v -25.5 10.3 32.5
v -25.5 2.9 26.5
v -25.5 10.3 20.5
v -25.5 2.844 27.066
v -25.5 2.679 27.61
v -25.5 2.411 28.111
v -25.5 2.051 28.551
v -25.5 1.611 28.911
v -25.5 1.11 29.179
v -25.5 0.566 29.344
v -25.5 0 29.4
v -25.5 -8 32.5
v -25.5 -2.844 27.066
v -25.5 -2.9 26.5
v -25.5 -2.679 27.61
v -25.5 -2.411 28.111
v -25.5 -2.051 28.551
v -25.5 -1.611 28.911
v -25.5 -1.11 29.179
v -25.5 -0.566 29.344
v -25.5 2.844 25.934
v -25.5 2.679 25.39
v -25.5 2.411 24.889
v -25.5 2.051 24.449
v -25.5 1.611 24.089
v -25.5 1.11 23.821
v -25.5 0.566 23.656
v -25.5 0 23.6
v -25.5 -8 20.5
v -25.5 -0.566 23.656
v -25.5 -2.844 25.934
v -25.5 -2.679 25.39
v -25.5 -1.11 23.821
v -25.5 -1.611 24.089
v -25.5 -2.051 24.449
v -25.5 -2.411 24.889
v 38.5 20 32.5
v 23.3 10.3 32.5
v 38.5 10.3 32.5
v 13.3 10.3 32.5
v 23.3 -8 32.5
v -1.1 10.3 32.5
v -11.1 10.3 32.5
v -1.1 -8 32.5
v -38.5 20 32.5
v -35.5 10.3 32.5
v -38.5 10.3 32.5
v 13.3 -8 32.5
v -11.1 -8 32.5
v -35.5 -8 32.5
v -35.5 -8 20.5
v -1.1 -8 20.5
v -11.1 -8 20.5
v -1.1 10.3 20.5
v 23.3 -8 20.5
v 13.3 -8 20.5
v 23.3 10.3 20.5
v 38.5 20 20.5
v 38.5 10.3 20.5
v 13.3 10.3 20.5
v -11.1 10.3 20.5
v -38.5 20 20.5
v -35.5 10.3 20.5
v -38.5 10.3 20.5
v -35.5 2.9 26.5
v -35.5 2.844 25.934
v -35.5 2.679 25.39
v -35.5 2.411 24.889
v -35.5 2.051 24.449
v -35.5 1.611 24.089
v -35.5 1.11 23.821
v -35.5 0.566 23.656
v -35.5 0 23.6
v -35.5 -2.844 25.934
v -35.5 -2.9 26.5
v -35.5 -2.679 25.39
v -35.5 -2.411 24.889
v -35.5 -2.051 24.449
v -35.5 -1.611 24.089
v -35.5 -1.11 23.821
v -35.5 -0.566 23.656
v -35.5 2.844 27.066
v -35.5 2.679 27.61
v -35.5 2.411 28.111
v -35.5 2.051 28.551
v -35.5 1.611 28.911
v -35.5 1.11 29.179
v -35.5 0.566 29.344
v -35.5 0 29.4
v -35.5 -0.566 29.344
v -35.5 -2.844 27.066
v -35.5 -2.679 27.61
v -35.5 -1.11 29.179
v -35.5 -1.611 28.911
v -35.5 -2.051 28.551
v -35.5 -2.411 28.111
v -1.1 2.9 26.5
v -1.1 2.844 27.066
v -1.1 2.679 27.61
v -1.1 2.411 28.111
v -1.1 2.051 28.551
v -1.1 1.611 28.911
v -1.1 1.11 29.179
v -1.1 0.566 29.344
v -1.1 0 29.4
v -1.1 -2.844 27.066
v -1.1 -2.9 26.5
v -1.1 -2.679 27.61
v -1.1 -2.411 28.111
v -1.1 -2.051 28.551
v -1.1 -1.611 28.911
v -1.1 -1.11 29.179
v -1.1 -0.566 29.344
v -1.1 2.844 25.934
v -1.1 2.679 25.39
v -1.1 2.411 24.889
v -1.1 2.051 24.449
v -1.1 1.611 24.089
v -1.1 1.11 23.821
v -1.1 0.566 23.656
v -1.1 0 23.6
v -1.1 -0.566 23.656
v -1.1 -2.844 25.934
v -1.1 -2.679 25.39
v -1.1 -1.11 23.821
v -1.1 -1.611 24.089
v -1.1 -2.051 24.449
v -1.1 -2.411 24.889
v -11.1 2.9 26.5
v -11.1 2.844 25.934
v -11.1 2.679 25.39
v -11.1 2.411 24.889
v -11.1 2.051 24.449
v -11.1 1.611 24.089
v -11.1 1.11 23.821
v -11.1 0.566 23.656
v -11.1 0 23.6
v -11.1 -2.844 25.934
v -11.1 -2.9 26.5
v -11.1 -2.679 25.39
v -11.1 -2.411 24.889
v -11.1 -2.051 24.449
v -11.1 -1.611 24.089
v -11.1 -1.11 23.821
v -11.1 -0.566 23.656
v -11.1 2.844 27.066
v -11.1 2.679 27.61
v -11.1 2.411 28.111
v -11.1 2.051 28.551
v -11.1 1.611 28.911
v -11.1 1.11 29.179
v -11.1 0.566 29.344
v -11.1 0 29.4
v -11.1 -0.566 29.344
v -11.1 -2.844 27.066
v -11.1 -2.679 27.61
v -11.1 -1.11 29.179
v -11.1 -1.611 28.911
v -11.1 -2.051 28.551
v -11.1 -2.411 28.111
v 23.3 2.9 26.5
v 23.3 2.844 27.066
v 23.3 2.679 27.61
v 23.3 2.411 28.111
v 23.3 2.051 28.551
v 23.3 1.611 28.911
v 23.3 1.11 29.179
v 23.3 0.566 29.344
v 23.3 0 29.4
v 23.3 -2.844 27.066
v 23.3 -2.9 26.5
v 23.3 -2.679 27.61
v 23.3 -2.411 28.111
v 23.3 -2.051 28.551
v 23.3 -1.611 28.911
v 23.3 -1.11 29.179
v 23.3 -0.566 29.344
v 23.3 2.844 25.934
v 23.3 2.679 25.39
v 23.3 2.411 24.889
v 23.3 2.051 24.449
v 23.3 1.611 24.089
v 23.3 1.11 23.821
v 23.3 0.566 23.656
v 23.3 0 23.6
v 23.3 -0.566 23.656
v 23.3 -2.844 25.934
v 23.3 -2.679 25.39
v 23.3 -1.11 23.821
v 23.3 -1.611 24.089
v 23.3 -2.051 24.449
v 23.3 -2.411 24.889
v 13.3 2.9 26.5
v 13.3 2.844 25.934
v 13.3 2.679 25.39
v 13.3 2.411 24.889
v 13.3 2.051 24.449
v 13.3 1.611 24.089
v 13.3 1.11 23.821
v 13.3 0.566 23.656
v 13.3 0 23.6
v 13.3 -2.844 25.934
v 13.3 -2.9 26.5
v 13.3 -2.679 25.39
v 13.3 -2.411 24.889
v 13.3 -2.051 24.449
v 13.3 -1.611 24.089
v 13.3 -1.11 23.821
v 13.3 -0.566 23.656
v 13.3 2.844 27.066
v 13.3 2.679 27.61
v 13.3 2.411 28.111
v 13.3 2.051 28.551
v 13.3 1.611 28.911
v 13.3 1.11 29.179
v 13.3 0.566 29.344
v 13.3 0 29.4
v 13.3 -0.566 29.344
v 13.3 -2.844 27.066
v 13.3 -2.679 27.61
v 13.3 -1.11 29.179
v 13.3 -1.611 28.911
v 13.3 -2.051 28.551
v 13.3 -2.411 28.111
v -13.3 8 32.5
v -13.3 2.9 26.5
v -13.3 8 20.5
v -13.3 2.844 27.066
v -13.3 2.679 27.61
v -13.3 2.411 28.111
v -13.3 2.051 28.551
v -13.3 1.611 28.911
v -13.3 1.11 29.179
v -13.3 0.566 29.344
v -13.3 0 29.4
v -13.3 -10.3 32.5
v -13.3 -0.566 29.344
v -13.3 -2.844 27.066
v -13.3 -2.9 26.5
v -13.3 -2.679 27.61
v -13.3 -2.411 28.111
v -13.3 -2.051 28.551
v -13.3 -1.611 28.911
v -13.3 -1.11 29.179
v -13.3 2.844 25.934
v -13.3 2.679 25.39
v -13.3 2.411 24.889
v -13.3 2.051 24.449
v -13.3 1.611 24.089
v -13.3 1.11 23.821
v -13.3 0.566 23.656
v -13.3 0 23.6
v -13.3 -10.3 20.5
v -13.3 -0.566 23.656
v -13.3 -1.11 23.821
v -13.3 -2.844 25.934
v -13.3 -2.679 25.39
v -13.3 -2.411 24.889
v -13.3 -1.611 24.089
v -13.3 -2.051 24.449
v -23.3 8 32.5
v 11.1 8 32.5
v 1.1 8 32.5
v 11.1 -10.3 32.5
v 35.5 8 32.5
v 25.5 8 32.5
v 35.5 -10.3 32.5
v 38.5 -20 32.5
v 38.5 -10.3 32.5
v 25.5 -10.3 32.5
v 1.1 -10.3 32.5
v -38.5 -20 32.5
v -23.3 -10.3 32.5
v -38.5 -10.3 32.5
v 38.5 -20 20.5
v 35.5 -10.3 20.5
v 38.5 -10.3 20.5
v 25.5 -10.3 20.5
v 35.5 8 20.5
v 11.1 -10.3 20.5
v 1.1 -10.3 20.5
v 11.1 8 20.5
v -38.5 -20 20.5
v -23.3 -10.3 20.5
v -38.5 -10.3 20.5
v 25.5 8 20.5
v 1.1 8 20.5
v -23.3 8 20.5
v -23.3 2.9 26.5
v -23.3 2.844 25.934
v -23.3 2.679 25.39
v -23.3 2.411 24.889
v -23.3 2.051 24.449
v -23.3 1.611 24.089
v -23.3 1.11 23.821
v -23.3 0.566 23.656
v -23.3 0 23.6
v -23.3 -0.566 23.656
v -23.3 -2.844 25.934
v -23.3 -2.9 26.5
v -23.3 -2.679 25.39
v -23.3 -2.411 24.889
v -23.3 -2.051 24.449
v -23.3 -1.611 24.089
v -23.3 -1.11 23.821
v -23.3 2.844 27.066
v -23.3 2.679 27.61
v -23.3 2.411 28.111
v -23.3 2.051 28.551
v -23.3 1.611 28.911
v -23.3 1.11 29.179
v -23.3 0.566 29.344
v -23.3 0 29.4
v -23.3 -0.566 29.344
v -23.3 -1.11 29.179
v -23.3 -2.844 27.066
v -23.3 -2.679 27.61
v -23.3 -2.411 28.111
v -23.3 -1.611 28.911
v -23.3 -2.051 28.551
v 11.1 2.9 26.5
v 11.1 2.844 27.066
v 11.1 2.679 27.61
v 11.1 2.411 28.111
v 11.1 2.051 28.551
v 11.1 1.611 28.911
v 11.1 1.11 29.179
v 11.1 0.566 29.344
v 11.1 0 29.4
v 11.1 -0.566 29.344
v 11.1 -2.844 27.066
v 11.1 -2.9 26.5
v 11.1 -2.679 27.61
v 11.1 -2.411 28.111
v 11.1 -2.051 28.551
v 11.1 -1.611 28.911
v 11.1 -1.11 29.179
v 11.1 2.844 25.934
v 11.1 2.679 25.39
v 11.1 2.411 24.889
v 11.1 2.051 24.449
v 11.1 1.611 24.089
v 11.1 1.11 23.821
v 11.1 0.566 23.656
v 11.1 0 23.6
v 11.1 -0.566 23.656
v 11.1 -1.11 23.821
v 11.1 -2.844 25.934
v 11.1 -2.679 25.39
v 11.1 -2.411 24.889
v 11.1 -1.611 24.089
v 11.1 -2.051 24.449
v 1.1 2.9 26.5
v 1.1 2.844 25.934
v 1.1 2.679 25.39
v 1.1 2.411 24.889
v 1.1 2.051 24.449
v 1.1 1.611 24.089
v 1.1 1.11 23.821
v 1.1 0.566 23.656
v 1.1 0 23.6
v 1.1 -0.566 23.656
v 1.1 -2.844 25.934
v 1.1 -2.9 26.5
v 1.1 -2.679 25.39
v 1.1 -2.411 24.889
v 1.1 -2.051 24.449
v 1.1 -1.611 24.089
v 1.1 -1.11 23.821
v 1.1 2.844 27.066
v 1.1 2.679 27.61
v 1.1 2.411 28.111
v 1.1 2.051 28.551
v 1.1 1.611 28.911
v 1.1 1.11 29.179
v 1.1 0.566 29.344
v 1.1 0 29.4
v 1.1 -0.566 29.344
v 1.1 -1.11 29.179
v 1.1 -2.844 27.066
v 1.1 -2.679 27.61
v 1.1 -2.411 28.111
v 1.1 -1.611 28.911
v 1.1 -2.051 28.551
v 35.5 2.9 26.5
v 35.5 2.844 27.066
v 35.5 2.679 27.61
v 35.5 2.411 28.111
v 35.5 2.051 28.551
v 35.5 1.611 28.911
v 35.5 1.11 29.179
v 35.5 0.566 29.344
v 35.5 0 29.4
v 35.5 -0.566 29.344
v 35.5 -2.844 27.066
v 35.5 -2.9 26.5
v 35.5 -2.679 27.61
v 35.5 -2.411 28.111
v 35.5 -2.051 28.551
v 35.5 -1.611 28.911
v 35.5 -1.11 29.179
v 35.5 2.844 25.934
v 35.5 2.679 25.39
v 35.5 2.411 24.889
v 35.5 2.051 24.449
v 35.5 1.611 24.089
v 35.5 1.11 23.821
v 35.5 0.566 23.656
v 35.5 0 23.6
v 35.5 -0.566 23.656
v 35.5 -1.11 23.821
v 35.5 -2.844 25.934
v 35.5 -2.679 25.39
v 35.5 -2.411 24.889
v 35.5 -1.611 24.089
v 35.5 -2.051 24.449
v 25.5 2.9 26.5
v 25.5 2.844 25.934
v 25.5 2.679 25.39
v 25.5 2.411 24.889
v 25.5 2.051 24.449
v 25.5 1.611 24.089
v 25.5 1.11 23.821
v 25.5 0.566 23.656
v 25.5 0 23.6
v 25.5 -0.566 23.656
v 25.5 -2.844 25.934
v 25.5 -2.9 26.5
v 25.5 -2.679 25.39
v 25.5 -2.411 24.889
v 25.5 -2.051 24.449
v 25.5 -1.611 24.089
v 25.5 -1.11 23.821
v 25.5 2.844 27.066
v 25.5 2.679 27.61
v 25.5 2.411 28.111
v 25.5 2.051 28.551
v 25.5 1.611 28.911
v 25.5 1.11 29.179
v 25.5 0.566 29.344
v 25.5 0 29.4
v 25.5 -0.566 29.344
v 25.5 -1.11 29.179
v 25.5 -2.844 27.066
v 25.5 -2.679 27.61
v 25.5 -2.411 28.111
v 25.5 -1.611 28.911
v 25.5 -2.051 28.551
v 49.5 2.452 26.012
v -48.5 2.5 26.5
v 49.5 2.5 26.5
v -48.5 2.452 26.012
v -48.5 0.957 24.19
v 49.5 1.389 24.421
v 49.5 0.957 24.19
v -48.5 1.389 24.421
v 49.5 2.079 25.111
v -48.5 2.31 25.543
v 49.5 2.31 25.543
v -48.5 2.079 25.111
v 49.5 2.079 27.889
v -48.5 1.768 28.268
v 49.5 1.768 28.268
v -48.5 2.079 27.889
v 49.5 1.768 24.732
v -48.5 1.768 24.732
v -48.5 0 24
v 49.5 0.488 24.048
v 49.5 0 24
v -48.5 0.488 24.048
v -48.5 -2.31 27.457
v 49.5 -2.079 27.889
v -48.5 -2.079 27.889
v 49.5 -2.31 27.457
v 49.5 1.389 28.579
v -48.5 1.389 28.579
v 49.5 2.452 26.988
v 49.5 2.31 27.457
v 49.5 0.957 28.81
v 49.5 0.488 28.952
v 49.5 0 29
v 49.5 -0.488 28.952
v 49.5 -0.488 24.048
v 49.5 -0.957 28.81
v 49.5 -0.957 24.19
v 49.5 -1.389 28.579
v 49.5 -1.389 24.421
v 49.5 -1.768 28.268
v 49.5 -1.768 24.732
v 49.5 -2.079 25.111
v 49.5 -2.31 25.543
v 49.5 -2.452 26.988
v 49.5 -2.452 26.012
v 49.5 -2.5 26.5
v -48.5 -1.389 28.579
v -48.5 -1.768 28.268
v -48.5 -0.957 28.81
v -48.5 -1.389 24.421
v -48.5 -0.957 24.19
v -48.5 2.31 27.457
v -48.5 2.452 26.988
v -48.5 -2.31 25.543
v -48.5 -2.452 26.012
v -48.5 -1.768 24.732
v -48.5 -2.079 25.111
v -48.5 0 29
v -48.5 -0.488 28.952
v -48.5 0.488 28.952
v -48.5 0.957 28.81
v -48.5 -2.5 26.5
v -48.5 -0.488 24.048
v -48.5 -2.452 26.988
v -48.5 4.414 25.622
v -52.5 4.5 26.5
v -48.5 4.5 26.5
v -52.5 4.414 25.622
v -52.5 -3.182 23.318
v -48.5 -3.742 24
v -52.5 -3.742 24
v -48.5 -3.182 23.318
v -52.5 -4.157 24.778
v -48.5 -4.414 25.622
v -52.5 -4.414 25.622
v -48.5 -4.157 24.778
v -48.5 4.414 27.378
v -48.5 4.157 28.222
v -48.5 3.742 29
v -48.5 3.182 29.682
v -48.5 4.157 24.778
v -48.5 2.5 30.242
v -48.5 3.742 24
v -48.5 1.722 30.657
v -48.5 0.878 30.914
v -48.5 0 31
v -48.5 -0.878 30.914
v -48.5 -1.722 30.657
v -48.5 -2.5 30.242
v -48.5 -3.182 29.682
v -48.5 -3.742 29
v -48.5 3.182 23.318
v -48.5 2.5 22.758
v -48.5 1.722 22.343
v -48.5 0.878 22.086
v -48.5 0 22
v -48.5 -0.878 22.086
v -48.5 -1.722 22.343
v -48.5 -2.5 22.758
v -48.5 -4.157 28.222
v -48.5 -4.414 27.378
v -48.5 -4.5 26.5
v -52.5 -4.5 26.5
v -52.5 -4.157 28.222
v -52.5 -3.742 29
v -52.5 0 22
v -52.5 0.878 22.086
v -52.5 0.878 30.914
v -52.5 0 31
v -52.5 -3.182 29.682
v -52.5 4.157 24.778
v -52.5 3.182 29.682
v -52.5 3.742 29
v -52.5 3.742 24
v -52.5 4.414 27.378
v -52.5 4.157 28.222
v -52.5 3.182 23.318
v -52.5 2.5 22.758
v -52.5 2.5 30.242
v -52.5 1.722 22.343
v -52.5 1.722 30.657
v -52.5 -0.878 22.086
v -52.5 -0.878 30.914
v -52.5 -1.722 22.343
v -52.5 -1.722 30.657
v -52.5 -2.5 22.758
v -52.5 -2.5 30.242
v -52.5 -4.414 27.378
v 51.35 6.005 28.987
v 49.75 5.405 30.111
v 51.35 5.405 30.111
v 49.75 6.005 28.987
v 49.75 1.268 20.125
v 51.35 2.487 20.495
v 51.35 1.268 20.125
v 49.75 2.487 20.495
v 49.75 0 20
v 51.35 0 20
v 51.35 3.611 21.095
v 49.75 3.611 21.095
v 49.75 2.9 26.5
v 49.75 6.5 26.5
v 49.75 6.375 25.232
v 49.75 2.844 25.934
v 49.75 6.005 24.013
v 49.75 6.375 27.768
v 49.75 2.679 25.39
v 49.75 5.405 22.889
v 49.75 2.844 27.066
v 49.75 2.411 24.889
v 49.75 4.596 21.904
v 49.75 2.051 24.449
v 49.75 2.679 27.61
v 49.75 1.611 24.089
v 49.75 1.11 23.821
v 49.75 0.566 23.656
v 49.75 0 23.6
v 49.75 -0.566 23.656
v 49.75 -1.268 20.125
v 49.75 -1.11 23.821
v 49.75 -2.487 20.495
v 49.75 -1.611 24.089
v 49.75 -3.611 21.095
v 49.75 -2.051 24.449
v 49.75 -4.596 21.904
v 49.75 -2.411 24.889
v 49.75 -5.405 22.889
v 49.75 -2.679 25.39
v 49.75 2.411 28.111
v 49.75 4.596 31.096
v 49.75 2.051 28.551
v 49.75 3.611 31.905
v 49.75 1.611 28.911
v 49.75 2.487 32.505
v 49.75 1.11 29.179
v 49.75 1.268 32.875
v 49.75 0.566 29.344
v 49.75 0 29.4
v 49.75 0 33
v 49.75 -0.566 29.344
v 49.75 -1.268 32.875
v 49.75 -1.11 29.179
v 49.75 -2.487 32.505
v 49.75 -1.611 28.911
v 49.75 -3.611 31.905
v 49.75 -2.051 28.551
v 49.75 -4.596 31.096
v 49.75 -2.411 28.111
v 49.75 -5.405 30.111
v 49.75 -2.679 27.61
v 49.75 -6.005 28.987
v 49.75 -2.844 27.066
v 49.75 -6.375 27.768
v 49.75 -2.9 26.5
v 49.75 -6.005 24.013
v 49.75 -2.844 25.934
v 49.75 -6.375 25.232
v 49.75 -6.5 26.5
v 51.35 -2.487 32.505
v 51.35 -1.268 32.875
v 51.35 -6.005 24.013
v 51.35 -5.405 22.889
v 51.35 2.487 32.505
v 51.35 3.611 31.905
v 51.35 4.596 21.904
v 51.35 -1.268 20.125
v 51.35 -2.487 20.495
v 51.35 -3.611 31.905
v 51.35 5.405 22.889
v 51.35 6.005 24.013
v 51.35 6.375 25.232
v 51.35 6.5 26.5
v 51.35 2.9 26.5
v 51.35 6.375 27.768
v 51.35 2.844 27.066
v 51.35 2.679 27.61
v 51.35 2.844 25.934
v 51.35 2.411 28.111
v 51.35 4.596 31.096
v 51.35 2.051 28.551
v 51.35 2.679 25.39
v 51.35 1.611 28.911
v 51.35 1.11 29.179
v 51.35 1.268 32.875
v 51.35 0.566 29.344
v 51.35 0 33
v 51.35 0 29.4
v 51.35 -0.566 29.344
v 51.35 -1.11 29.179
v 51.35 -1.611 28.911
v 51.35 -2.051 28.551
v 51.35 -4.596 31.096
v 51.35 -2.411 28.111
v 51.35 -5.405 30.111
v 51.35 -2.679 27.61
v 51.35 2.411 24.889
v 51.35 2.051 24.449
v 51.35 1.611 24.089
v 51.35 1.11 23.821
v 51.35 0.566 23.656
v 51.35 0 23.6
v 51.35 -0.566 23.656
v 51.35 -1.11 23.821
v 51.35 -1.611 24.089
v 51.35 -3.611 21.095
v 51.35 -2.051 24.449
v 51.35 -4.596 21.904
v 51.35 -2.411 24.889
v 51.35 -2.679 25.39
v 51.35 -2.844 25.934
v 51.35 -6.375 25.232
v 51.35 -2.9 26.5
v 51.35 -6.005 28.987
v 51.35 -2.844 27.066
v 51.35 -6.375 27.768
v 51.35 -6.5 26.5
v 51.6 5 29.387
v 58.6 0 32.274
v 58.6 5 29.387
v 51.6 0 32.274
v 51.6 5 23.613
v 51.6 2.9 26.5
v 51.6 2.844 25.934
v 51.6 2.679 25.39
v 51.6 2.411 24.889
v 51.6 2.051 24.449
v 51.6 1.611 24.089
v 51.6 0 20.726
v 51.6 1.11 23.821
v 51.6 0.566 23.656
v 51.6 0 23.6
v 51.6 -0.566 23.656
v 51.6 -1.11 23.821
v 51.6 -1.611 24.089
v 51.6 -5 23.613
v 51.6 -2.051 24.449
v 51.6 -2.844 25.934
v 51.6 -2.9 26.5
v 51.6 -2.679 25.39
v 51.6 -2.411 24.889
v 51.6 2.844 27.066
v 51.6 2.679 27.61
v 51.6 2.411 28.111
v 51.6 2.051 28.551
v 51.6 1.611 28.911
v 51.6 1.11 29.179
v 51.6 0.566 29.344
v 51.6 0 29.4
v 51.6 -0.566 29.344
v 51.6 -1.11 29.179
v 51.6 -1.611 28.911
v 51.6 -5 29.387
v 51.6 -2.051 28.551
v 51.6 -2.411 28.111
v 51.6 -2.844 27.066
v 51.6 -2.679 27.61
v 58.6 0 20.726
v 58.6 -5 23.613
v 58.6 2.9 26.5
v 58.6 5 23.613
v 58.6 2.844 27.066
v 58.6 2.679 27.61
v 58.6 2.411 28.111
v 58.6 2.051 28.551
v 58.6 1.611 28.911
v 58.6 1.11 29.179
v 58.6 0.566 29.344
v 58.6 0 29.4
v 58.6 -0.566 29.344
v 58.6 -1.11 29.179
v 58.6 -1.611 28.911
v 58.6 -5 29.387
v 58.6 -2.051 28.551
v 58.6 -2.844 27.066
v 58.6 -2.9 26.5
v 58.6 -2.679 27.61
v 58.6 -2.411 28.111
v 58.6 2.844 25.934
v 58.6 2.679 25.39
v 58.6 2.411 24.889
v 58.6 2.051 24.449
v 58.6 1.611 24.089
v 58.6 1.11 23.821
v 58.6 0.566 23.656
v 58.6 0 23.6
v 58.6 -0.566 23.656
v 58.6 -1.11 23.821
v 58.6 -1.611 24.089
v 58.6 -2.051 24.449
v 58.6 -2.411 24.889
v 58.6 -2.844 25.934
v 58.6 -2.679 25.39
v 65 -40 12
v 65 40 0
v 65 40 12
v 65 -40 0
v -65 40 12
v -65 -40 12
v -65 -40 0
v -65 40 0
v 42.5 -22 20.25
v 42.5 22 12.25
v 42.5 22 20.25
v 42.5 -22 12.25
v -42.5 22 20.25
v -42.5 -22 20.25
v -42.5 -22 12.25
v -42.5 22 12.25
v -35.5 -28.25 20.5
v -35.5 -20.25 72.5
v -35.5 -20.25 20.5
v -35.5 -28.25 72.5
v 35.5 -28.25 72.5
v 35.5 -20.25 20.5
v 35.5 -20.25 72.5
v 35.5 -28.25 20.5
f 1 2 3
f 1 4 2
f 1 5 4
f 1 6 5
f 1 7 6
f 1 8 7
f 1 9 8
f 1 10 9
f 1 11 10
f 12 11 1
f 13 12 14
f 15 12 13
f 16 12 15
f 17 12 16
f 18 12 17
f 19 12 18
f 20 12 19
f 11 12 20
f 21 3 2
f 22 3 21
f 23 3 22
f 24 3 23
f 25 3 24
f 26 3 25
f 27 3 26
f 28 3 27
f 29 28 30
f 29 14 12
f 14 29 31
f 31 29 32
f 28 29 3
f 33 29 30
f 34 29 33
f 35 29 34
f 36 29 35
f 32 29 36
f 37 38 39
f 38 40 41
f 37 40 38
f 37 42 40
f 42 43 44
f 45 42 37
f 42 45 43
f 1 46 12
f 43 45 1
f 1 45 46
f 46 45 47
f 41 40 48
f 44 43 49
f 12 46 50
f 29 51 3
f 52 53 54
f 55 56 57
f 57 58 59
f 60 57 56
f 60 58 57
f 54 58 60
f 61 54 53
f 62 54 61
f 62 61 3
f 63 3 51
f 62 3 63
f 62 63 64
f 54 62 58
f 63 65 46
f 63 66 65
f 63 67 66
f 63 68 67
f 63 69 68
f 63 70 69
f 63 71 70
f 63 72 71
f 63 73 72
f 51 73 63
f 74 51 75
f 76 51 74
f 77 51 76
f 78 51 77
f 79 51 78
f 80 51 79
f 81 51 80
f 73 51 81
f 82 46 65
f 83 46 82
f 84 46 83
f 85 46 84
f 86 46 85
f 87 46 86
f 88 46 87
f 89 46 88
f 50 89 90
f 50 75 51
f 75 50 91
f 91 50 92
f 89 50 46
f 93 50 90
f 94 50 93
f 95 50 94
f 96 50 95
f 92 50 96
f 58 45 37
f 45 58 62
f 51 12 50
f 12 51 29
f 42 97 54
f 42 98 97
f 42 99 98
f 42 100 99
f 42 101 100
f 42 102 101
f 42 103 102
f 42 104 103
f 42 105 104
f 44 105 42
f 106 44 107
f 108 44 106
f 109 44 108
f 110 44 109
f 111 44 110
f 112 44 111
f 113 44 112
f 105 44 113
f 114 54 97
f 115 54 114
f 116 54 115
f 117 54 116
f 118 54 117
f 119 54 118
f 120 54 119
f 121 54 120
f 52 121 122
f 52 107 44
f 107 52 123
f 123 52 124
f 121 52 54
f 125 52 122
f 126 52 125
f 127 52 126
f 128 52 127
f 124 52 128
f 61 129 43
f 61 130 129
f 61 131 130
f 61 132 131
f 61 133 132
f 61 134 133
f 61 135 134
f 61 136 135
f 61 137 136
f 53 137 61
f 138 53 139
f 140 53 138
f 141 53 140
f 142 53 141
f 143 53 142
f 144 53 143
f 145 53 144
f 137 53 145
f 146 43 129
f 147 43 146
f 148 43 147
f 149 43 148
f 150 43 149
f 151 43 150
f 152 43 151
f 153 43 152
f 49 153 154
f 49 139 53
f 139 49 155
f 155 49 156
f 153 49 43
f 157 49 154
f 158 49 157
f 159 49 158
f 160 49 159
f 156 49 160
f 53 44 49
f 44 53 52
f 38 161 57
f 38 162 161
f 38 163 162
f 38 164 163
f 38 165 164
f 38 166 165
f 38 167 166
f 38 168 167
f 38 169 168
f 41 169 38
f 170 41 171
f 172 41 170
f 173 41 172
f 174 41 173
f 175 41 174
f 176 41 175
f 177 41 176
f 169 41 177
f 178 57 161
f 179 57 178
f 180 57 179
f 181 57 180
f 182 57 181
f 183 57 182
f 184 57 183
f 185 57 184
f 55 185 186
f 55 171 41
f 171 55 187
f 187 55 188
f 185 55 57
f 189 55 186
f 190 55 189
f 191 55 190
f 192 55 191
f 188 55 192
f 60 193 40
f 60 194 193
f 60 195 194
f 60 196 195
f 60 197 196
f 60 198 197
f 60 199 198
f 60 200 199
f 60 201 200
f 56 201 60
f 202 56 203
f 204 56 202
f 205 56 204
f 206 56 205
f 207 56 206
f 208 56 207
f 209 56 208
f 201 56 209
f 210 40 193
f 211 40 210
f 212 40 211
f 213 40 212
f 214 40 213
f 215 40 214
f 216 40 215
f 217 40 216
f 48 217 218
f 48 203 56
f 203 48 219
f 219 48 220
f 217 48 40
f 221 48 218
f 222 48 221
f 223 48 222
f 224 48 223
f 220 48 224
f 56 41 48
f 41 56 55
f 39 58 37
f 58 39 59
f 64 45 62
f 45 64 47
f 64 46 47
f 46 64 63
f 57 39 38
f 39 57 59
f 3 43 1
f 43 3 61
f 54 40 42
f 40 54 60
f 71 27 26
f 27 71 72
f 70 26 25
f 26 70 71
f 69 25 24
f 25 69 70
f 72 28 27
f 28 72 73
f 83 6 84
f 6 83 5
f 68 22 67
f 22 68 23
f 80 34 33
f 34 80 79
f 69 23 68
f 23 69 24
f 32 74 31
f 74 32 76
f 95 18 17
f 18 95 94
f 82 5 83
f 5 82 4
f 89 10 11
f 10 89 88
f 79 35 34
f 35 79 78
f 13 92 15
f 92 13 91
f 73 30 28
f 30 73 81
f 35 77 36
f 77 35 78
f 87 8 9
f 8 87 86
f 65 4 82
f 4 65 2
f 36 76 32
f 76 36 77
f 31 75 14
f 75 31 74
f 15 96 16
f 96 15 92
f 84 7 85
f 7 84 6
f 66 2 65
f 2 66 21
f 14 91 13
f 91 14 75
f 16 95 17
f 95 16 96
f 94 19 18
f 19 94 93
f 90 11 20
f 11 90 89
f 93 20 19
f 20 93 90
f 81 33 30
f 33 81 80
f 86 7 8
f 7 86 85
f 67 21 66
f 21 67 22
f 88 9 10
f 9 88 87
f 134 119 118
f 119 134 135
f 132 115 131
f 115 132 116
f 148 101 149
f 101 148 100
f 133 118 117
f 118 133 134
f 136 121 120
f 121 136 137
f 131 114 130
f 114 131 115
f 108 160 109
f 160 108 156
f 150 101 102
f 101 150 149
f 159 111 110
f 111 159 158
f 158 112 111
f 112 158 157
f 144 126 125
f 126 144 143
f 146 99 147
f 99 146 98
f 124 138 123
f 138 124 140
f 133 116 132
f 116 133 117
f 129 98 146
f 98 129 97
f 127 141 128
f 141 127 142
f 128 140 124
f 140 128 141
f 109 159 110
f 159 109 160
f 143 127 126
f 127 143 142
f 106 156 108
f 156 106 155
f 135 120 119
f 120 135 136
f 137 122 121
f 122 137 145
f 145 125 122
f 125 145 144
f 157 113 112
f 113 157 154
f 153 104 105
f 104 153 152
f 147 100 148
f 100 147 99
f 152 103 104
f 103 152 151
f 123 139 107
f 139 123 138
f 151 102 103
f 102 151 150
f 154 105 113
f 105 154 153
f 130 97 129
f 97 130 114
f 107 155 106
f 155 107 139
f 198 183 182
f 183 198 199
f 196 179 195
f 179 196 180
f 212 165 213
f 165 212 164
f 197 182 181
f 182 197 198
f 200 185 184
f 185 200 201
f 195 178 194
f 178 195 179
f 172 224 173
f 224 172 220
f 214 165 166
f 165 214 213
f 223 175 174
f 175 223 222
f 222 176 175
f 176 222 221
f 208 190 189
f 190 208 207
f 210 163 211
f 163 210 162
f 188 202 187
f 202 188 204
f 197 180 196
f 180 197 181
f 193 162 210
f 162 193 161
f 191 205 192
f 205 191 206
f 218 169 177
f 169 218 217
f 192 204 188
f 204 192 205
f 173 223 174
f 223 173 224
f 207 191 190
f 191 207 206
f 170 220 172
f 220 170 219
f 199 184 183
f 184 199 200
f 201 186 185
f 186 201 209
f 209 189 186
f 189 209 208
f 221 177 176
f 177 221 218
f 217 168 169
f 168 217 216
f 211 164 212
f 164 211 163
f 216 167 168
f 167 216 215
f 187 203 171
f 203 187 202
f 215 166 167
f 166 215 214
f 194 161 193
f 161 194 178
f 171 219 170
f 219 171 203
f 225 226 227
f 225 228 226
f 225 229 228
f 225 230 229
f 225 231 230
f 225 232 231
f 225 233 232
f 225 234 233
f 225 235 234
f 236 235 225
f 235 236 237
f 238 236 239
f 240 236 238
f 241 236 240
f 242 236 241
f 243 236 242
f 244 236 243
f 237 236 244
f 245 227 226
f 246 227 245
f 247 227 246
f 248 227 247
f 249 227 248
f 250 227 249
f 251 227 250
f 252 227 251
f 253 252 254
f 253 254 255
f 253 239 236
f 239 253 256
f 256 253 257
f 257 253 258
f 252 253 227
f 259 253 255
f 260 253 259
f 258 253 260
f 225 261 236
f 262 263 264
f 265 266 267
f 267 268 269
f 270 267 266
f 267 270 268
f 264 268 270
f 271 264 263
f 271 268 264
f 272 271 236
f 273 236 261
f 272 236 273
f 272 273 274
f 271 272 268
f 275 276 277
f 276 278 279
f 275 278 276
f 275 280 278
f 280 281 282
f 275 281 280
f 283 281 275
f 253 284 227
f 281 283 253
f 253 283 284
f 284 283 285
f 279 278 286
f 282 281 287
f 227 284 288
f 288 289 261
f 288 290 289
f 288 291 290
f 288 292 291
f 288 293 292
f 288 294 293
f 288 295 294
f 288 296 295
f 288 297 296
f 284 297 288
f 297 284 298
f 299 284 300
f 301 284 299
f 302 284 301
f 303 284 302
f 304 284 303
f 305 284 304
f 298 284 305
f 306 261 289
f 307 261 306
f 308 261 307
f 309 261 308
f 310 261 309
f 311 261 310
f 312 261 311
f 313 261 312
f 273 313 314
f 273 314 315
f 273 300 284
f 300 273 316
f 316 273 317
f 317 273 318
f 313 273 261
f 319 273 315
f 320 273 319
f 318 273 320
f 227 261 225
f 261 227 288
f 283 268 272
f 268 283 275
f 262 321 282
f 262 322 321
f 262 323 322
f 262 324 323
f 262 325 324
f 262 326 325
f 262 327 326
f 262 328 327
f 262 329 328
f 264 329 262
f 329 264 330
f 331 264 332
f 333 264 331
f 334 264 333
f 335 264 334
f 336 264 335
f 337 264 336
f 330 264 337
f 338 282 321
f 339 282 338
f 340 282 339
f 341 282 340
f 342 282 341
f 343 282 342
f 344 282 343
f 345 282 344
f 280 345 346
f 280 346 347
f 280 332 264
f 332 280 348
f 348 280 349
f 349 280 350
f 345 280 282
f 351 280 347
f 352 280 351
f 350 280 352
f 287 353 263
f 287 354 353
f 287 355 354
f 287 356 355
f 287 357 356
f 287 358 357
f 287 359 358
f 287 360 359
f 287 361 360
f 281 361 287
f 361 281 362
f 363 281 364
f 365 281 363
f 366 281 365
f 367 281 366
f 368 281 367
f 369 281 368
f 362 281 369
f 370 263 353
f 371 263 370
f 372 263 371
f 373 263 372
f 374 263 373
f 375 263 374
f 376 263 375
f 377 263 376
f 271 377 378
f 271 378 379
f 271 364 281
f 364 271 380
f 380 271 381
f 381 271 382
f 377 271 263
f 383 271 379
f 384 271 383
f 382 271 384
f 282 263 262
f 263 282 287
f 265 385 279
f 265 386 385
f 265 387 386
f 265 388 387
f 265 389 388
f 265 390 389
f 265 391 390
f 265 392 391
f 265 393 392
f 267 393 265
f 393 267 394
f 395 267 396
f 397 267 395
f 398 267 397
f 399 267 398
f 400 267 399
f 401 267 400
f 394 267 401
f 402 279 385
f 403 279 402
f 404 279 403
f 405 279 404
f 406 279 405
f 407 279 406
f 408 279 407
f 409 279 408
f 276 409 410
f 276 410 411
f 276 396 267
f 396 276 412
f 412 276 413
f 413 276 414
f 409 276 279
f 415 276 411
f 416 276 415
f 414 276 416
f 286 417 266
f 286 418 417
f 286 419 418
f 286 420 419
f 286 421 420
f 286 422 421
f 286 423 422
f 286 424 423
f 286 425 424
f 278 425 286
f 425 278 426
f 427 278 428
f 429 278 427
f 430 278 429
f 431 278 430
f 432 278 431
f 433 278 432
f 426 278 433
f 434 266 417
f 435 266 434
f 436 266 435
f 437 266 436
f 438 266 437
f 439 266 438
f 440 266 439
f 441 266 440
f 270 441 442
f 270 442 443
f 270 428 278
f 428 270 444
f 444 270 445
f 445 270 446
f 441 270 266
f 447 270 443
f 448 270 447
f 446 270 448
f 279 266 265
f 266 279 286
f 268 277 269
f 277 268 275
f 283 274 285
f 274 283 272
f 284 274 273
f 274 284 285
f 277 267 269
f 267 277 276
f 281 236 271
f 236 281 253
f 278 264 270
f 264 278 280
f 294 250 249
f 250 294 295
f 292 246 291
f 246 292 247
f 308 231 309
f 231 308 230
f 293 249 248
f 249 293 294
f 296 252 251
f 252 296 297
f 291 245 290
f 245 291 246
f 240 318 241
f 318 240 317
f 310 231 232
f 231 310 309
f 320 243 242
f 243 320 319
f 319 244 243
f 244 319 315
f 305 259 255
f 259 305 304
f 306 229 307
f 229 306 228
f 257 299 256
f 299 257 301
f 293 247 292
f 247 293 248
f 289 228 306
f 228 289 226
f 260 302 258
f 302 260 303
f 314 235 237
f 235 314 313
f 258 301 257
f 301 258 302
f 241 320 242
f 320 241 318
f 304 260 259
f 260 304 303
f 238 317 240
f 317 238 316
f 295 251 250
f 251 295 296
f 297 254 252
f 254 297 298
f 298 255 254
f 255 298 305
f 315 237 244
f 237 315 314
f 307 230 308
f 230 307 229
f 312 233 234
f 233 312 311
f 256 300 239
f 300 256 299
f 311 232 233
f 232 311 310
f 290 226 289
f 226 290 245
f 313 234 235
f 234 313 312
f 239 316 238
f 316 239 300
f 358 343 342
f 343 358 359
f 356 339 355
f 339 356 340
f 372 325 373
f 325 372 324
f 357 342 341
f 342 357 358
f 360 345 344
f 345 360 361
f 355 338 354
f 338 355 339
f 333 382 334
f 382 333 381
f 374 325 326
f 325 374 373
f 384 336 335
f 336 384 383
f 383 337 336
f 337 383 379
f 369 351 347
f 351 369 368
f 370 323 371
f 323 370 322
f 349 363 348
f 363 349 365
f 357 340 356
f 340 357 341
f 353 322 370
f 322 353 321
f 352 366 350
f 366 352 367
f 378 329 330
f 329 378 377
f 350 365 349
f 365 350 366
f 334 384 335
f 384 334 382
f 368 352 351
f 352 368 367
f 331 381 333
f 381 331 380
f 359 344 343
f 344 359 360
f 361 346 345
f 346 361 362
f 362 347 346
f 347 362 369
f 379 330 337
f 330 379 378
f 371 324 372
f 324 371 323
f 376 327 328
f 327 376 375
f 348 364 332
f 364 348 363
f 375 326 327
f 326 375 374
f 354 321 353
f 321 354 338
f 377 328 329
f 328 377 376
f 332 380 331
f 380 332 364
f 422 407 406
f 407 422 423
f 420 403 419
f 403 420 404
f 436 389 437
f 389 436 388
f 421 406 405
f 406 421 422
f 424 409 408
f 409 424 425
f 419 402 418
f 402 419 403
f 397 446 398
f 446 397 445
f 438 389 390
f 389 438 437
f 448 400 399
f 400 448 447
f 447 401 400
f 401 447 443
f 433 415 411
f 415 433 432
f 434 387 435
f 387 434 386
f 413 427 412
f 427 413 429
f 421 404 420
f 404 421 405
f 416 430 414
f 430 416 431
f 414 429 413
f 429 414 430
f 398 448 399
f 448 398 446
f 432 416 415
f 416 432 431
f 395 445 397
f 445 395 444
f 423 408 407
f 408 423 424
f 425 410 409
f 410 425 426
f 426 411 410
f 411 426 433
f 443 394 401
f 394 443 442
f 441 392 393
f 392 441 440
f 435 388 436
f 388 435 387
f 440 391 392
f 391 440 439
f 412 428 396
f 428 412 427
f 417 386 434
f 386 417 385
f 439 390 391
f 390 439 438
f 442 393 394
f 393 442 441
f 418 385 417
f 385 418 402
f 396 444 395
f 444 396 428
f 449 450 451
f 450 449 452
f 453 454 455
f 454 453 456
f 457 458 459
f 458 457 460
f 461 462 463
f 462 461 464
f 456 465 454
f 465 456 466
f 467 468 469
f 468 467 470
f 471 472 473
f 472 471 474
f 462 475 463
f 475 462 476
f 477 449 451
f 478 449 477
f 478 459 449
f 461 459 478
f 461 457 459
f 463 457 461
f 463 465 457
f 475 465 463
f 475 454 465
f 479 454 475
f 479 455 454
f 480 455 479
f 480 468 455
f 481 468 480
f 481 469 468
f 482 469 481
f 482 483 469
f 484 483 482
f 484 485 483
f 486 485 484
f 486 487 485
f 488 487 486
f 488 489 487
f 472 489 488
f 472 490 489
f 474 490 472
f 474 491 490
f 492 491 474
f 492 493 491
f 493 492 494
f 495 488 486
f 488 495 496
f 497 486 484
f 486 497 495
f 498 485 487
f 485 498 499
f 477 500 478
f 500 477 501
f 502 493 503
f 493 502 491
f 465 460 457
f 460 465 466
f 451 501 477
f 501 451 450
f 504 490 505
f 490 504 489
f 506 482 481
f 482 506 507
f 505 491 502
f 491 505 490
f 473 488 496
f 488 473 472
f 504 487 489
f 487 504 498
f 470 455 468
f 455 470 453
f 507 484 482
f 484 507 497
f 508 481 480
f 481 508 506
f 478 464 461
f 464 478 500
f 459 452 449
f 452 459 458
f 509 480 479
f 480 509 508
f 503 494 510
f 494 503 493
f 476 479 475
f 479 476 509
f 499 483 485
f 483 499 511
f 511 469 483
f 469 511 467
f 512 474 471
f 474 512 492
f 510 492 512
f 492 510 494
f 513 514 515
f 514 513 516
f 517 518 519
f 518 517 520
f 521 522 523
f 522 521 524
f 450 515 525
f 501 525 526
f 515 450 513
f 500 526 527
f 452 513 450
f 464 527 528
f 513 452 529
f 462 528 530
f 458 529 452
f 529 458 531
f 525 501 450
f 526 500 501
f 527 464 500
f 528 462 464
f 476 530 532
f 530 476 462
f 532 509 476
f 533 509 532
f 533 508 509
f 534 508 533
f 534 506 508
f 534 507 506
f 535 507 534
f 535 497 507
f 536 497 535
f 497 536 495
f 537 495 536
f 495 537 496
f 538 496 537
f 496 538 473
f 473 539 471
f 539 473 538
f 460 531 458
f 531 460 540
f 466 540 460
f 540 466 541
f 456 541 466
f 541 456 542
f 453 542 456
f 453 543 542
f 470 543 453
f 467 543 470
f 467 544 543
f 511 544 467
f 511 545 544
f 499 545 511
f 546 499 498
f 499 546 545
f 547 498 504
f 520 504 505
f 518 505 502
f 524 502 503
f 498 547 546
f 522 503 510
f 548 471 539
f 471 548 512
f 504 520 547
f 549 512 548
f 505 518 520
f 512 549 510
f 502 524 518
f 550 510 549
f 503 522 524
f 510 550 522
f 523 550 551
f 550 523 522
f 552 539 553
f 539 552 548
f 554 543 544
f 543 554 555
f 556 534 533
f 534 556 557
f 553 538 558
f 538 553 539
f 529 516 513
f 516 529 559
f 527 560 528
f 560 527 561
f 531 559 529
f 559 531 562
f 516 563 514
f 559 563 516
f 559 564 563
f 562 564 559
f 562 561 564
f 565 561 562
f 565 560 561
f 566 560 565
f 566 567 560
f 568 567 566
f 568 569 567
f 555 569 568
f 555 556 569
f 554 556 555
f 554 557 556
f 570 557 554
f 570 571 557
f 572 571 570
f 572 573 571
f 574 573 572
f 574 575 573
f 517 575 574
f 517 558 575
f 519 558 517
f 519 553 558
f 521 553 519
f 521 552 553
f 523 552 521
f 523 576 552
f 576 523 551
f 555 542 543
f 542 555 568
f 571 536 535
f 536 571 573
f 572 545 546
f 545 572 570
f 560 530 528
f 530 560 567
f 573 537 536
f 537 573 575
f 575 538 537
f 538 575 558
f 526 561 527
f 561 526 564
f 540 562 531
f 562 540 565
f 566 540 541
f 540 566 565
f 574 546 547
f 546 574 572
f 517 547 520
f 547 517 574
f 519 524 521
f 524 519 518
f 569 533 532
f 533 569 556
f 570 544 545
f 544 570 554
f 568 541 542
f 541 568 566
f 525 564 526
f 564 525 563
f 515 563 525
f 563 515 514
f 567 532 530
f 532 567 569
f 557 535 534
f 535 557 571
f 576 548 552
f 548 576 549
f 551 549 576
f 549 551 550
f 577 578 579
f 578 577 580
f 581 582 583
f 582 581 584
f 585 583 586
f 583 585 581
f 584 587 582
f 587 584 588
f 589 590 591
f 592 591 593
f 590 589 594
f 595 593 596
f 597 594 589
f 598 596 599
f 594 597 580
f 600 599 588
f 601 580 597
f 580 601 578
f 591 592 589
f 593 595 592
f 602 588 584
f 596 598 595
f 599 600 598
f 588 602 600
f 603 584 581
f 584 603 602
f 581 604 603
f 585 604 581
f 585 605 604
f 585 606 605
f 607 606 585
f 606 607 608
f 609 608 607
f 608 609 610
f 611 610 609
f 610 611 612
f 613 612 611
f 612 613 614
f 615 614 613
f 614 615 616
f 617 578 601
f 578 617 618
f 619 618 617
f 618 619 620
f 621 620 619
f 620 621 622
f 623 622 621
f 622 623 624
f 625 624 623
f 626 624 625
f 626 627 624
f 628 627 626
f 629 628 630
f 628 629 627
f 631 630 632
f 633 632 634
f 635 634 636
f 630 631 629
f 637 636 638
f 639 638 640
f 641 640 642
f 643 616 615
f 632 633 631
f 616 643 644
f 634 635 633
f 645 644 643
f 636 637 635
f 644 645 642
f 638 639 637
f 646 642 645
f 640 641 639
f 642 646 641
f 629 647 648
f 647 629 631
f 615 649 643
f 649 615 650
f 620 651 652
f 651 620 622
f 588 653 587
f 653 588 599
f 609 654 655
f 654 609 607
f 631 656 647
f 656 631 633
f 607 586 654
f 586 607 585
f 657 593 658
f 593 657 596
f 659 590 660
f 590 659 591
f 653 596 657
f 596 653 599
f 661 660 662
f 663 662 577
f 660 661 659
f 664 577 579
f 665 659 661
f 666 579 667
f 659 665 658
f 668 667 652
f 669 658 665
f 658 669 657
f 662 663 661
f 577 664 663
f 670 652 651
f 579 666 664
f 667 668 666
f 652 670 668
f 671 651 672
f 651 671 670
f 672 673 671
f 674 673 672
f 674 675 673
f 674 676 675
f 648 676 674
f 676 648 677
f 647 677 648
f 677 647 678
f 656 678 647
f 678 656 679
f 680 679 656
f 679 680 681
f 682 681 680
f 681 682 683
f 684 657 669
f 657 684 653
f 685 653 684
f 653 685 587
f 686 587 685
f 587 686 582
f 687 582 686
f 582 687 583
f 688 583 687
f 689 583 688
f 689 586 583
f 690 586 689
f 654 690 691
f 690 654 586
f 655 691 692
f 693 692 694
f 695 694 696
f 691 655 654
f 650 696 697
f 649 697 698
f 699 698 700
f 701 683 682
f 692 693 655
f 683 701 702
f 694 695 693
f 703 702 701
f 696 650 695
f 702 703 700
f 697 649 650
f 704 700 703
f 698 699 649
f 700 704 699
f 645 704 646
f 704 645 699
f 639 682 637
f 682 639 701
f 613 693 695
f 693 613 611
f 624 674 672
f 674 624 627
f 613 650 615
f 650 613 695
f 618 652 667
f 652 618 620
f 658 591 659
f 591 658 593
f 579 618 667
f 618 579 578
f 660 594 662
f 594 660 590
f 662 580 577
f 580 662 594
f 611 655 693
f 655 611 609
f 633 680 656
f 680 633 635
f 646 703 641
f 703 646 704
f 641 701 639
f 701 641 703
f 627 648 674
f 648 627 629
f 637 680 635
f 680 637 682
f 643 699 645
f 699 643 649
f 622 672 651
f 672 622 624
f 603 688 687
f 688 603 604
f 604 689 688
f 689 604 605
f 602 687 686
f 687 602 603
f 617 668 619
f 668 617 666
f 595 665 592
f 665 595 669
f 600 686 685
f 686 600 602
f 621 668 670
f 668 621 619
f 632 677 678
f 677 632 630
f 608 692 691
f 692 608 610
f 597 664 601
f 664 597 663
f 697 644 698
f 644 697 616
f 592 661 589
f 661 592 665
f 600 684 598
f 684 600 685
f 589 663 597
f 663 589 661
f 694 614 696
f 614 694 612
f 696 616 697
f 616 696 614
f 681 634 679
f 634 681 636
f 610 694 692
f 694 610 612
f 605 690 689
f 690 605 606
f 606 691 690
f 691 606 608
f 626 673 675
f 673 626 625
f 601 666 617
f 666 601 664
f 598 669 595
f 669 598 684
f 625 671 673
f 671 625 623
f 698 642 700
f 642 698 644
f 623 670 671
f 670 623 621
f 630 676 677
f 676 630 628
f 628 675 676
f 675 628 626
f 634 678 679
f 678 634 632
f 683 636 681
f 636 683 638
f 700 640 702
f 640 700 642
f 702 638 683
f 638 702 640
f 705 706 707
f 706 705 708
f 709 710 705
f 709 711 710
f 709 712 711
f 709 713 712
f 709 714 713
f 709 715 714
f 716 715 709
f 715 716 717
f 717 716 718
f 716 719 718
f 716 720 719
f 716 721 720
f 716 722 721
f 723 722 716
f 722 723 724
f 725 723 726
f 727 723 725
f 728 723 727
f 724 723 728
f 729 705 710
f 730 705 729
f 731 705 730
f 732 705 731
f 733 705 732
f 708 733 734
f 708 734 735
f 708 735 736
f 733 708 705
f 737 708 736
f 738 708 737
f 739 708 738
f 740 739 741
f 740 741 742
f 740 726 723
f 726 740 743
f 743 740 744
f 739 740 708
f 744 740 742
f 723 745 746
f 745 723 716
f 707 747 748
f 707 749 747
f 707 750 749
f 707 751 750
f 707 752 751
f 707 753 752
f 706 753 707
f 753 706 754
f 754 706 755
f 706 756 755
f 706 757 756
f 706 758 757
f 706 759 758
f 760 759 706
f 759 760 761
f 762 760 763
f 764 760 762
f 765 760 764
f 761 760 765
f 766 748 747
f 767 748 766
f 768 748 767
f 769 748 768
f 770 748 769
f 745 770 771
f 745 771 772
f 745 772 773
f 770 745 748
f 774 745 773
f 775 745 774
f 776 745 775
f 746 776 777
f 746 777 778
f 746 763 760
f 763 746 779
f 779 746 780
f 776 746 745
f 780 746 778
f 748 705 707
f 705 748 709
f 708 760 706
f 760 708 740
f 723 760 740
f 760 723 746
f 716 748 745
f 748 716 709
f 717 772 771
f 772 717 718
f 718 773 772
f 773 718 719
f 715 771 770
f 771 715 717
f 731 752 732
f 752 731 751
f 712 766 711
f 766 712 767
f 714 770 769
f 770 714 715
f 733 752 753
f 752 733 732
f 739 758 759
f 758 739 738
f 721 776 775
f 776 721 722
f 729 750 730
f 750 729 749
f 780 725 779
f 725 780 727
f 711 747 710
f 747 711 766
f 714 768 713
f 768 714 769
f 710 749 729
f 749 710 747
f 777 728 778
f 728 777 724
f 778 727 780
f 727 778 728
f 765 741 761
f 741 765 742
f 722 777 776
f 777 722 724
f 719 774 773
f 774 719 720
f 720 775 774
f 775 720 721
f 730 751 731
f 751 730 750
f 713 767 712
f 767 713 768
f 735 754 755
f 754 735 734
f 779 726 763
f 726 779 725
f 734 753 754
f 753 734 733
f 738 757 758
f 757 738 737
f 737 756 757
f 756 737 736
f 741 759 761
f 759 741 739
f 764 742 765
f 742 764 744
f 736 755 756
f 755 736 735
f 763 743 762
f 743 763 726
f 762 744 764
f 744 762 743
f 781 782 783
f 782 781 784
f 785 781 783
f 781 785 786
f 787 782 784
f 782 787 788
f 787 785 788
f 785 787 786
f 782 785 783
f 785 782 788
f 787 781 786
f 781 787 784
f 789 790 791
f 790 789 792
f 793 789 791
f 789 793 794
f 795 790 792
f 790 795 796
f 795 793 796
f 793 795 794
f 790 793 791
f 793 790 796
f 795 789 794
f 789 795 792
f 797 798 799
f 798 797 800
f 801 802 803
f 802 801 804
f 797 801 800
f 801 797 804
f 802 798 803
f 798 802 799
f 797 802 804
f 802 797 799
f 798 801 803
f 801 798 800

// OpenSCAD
$fn = 32;

// ------------------------------------------------------------------------
// Comb hinge with flap: leaf 77 x 20 mm, pin d5, flap 52 mm
// Every part is its own module, assembly() places every instance.
// ------------------------------------------------------------------------

// --- part 1 ---
module hinge_bed() {
  difference() {
    translate([-65, -40, 0]) cube([130, 80, 12]);
  }
}

// --- part 2 ---
module hinge_riser() {
  difference() {
    translate([-42.5, -22, 0]) cube([85, 44, 8]);
  }
}

// --- part 3 ---
module hinge_leaf_a() {
  difference() {
    union() {
      translate([-35.5, -8, -6]) cube([10, 28, 12]);
      translate([-11.1, -8, -6]) cube([10, 28, 12]);
      translate([13.3, -8, -6]) cube([10, 28, 12]);
      translate([-38.5, 10.3, -6]) cube([77, 9.7, 12]);
    }
    translate([-30.5, 0, 0]) rotate([0, 90, 0]) cylinder(h = 12, d = 5.8, center = true);
    translate([-6.1, 0, 0]) rotate([0, 90, 0]) cylinder(h = 12, d = 5.8, center = true);
    translate([18.3, 0, 0]) rotate([0, 90, 0]) cylinder(h = 12, d = 5.8, center = true);
  }
}

// --- part 4 ---
module hinge_leaf_b() {
  difference() {
    union() {
      translate([-23.3, -20, -6]) cube([10, 28, 12]);
      translate([1.1, -20, -6]) cube([10, 28, 12]);
      translate([25.5, -20, -6]) cube([10, 28, 12]);
      translate([-38.5, -20, -6]) cube([77, 9.7, 12]);
    }
    translate([-18.3, 0, 0]) rotate([0, 90, 0]) cylinder(h = 12, d = 5.8, center = true);
    translate([6.1, 0, 0]) rotate([0, 90, 0]) cylinder(h = 12, d = 5.8, center = true);
    translate([30.5, 0, 0]) rotate([0, 90, 0]) cylinder(h = 12, d = 5.8, center = true);
  }
}

// --- part 5 ---
module hinge_flap() {
  difference() {
    translate([-35.5, -26, 0]) cube([71, 52, 8]);
  }
}

// --- part 6 ---
module hinge_pin() {
  rotate([0, 90, 0]) cylinder(h = 99, d = 5, center = true);
  translate([-52.5, 0, 0]) rotate([0, 90, 0]) cylinder(h = 4, d = 9);
}

// --- part 7 ---
module pin_washer() {
  difference() {
      translate([0, 0, 0]) cylinder(h = 1.6, d = 13);
      translate([0, 0, -1]) cylinder(h = 3.6, d = 5.8);
    }
}

// --- part 8 ---
module pin_nut() {
  difference() {
    linear_extrude(height = 7) polygon(points = [[5.774, 0], [2.887, 5], [-2.887, 5], [-5.774, 0], [-2.887, -5], [2.887, -5]]);
    translate([0, 0, -1]) cylinder(h = 9, d = 5.8);
  }
}

// --- assembly ---
module assembly() {
  color([0.80, 0.24, 0.20]) translate([0, 0, 0]) rotate([0, 0, 0]) hinge_bed();
  color([0.20, 0.45, 0.75]) translate([0, 0, 12.25]) rotate([0, 0, 0]) hinge_riser();
  color([0.25, 0.62, 0.32]) translate([0, 0, 26.5]) rotate([0, 0, 0]) hinge_leaf_a();
  color([0.92, 0.70, 0.18]) translate([0, 0, 26.5]) rotate([0, 0, 0]) hinge_leaf_b();
  color([0.58, 0.35, 0.70]) translate([0, -20.25, 46.5]) rotate([90, 0, 0]) hinge_flap();
  color([0.16, 0.66, 0.66]) translate([0, 0, 26.5]) rotate([0, 0, 0]) hinge_pin();
  color([0.85, 0.48, 0.18]) translate([49.75, 0, 26.5]) rotate([0, 90, 0]) pin_washer();
  color([0.55, 0.60, 0.65]) translate([51.6, 0, 26.5]) rotate([0, 90, 0]) pin_nut();
}

assembly();
